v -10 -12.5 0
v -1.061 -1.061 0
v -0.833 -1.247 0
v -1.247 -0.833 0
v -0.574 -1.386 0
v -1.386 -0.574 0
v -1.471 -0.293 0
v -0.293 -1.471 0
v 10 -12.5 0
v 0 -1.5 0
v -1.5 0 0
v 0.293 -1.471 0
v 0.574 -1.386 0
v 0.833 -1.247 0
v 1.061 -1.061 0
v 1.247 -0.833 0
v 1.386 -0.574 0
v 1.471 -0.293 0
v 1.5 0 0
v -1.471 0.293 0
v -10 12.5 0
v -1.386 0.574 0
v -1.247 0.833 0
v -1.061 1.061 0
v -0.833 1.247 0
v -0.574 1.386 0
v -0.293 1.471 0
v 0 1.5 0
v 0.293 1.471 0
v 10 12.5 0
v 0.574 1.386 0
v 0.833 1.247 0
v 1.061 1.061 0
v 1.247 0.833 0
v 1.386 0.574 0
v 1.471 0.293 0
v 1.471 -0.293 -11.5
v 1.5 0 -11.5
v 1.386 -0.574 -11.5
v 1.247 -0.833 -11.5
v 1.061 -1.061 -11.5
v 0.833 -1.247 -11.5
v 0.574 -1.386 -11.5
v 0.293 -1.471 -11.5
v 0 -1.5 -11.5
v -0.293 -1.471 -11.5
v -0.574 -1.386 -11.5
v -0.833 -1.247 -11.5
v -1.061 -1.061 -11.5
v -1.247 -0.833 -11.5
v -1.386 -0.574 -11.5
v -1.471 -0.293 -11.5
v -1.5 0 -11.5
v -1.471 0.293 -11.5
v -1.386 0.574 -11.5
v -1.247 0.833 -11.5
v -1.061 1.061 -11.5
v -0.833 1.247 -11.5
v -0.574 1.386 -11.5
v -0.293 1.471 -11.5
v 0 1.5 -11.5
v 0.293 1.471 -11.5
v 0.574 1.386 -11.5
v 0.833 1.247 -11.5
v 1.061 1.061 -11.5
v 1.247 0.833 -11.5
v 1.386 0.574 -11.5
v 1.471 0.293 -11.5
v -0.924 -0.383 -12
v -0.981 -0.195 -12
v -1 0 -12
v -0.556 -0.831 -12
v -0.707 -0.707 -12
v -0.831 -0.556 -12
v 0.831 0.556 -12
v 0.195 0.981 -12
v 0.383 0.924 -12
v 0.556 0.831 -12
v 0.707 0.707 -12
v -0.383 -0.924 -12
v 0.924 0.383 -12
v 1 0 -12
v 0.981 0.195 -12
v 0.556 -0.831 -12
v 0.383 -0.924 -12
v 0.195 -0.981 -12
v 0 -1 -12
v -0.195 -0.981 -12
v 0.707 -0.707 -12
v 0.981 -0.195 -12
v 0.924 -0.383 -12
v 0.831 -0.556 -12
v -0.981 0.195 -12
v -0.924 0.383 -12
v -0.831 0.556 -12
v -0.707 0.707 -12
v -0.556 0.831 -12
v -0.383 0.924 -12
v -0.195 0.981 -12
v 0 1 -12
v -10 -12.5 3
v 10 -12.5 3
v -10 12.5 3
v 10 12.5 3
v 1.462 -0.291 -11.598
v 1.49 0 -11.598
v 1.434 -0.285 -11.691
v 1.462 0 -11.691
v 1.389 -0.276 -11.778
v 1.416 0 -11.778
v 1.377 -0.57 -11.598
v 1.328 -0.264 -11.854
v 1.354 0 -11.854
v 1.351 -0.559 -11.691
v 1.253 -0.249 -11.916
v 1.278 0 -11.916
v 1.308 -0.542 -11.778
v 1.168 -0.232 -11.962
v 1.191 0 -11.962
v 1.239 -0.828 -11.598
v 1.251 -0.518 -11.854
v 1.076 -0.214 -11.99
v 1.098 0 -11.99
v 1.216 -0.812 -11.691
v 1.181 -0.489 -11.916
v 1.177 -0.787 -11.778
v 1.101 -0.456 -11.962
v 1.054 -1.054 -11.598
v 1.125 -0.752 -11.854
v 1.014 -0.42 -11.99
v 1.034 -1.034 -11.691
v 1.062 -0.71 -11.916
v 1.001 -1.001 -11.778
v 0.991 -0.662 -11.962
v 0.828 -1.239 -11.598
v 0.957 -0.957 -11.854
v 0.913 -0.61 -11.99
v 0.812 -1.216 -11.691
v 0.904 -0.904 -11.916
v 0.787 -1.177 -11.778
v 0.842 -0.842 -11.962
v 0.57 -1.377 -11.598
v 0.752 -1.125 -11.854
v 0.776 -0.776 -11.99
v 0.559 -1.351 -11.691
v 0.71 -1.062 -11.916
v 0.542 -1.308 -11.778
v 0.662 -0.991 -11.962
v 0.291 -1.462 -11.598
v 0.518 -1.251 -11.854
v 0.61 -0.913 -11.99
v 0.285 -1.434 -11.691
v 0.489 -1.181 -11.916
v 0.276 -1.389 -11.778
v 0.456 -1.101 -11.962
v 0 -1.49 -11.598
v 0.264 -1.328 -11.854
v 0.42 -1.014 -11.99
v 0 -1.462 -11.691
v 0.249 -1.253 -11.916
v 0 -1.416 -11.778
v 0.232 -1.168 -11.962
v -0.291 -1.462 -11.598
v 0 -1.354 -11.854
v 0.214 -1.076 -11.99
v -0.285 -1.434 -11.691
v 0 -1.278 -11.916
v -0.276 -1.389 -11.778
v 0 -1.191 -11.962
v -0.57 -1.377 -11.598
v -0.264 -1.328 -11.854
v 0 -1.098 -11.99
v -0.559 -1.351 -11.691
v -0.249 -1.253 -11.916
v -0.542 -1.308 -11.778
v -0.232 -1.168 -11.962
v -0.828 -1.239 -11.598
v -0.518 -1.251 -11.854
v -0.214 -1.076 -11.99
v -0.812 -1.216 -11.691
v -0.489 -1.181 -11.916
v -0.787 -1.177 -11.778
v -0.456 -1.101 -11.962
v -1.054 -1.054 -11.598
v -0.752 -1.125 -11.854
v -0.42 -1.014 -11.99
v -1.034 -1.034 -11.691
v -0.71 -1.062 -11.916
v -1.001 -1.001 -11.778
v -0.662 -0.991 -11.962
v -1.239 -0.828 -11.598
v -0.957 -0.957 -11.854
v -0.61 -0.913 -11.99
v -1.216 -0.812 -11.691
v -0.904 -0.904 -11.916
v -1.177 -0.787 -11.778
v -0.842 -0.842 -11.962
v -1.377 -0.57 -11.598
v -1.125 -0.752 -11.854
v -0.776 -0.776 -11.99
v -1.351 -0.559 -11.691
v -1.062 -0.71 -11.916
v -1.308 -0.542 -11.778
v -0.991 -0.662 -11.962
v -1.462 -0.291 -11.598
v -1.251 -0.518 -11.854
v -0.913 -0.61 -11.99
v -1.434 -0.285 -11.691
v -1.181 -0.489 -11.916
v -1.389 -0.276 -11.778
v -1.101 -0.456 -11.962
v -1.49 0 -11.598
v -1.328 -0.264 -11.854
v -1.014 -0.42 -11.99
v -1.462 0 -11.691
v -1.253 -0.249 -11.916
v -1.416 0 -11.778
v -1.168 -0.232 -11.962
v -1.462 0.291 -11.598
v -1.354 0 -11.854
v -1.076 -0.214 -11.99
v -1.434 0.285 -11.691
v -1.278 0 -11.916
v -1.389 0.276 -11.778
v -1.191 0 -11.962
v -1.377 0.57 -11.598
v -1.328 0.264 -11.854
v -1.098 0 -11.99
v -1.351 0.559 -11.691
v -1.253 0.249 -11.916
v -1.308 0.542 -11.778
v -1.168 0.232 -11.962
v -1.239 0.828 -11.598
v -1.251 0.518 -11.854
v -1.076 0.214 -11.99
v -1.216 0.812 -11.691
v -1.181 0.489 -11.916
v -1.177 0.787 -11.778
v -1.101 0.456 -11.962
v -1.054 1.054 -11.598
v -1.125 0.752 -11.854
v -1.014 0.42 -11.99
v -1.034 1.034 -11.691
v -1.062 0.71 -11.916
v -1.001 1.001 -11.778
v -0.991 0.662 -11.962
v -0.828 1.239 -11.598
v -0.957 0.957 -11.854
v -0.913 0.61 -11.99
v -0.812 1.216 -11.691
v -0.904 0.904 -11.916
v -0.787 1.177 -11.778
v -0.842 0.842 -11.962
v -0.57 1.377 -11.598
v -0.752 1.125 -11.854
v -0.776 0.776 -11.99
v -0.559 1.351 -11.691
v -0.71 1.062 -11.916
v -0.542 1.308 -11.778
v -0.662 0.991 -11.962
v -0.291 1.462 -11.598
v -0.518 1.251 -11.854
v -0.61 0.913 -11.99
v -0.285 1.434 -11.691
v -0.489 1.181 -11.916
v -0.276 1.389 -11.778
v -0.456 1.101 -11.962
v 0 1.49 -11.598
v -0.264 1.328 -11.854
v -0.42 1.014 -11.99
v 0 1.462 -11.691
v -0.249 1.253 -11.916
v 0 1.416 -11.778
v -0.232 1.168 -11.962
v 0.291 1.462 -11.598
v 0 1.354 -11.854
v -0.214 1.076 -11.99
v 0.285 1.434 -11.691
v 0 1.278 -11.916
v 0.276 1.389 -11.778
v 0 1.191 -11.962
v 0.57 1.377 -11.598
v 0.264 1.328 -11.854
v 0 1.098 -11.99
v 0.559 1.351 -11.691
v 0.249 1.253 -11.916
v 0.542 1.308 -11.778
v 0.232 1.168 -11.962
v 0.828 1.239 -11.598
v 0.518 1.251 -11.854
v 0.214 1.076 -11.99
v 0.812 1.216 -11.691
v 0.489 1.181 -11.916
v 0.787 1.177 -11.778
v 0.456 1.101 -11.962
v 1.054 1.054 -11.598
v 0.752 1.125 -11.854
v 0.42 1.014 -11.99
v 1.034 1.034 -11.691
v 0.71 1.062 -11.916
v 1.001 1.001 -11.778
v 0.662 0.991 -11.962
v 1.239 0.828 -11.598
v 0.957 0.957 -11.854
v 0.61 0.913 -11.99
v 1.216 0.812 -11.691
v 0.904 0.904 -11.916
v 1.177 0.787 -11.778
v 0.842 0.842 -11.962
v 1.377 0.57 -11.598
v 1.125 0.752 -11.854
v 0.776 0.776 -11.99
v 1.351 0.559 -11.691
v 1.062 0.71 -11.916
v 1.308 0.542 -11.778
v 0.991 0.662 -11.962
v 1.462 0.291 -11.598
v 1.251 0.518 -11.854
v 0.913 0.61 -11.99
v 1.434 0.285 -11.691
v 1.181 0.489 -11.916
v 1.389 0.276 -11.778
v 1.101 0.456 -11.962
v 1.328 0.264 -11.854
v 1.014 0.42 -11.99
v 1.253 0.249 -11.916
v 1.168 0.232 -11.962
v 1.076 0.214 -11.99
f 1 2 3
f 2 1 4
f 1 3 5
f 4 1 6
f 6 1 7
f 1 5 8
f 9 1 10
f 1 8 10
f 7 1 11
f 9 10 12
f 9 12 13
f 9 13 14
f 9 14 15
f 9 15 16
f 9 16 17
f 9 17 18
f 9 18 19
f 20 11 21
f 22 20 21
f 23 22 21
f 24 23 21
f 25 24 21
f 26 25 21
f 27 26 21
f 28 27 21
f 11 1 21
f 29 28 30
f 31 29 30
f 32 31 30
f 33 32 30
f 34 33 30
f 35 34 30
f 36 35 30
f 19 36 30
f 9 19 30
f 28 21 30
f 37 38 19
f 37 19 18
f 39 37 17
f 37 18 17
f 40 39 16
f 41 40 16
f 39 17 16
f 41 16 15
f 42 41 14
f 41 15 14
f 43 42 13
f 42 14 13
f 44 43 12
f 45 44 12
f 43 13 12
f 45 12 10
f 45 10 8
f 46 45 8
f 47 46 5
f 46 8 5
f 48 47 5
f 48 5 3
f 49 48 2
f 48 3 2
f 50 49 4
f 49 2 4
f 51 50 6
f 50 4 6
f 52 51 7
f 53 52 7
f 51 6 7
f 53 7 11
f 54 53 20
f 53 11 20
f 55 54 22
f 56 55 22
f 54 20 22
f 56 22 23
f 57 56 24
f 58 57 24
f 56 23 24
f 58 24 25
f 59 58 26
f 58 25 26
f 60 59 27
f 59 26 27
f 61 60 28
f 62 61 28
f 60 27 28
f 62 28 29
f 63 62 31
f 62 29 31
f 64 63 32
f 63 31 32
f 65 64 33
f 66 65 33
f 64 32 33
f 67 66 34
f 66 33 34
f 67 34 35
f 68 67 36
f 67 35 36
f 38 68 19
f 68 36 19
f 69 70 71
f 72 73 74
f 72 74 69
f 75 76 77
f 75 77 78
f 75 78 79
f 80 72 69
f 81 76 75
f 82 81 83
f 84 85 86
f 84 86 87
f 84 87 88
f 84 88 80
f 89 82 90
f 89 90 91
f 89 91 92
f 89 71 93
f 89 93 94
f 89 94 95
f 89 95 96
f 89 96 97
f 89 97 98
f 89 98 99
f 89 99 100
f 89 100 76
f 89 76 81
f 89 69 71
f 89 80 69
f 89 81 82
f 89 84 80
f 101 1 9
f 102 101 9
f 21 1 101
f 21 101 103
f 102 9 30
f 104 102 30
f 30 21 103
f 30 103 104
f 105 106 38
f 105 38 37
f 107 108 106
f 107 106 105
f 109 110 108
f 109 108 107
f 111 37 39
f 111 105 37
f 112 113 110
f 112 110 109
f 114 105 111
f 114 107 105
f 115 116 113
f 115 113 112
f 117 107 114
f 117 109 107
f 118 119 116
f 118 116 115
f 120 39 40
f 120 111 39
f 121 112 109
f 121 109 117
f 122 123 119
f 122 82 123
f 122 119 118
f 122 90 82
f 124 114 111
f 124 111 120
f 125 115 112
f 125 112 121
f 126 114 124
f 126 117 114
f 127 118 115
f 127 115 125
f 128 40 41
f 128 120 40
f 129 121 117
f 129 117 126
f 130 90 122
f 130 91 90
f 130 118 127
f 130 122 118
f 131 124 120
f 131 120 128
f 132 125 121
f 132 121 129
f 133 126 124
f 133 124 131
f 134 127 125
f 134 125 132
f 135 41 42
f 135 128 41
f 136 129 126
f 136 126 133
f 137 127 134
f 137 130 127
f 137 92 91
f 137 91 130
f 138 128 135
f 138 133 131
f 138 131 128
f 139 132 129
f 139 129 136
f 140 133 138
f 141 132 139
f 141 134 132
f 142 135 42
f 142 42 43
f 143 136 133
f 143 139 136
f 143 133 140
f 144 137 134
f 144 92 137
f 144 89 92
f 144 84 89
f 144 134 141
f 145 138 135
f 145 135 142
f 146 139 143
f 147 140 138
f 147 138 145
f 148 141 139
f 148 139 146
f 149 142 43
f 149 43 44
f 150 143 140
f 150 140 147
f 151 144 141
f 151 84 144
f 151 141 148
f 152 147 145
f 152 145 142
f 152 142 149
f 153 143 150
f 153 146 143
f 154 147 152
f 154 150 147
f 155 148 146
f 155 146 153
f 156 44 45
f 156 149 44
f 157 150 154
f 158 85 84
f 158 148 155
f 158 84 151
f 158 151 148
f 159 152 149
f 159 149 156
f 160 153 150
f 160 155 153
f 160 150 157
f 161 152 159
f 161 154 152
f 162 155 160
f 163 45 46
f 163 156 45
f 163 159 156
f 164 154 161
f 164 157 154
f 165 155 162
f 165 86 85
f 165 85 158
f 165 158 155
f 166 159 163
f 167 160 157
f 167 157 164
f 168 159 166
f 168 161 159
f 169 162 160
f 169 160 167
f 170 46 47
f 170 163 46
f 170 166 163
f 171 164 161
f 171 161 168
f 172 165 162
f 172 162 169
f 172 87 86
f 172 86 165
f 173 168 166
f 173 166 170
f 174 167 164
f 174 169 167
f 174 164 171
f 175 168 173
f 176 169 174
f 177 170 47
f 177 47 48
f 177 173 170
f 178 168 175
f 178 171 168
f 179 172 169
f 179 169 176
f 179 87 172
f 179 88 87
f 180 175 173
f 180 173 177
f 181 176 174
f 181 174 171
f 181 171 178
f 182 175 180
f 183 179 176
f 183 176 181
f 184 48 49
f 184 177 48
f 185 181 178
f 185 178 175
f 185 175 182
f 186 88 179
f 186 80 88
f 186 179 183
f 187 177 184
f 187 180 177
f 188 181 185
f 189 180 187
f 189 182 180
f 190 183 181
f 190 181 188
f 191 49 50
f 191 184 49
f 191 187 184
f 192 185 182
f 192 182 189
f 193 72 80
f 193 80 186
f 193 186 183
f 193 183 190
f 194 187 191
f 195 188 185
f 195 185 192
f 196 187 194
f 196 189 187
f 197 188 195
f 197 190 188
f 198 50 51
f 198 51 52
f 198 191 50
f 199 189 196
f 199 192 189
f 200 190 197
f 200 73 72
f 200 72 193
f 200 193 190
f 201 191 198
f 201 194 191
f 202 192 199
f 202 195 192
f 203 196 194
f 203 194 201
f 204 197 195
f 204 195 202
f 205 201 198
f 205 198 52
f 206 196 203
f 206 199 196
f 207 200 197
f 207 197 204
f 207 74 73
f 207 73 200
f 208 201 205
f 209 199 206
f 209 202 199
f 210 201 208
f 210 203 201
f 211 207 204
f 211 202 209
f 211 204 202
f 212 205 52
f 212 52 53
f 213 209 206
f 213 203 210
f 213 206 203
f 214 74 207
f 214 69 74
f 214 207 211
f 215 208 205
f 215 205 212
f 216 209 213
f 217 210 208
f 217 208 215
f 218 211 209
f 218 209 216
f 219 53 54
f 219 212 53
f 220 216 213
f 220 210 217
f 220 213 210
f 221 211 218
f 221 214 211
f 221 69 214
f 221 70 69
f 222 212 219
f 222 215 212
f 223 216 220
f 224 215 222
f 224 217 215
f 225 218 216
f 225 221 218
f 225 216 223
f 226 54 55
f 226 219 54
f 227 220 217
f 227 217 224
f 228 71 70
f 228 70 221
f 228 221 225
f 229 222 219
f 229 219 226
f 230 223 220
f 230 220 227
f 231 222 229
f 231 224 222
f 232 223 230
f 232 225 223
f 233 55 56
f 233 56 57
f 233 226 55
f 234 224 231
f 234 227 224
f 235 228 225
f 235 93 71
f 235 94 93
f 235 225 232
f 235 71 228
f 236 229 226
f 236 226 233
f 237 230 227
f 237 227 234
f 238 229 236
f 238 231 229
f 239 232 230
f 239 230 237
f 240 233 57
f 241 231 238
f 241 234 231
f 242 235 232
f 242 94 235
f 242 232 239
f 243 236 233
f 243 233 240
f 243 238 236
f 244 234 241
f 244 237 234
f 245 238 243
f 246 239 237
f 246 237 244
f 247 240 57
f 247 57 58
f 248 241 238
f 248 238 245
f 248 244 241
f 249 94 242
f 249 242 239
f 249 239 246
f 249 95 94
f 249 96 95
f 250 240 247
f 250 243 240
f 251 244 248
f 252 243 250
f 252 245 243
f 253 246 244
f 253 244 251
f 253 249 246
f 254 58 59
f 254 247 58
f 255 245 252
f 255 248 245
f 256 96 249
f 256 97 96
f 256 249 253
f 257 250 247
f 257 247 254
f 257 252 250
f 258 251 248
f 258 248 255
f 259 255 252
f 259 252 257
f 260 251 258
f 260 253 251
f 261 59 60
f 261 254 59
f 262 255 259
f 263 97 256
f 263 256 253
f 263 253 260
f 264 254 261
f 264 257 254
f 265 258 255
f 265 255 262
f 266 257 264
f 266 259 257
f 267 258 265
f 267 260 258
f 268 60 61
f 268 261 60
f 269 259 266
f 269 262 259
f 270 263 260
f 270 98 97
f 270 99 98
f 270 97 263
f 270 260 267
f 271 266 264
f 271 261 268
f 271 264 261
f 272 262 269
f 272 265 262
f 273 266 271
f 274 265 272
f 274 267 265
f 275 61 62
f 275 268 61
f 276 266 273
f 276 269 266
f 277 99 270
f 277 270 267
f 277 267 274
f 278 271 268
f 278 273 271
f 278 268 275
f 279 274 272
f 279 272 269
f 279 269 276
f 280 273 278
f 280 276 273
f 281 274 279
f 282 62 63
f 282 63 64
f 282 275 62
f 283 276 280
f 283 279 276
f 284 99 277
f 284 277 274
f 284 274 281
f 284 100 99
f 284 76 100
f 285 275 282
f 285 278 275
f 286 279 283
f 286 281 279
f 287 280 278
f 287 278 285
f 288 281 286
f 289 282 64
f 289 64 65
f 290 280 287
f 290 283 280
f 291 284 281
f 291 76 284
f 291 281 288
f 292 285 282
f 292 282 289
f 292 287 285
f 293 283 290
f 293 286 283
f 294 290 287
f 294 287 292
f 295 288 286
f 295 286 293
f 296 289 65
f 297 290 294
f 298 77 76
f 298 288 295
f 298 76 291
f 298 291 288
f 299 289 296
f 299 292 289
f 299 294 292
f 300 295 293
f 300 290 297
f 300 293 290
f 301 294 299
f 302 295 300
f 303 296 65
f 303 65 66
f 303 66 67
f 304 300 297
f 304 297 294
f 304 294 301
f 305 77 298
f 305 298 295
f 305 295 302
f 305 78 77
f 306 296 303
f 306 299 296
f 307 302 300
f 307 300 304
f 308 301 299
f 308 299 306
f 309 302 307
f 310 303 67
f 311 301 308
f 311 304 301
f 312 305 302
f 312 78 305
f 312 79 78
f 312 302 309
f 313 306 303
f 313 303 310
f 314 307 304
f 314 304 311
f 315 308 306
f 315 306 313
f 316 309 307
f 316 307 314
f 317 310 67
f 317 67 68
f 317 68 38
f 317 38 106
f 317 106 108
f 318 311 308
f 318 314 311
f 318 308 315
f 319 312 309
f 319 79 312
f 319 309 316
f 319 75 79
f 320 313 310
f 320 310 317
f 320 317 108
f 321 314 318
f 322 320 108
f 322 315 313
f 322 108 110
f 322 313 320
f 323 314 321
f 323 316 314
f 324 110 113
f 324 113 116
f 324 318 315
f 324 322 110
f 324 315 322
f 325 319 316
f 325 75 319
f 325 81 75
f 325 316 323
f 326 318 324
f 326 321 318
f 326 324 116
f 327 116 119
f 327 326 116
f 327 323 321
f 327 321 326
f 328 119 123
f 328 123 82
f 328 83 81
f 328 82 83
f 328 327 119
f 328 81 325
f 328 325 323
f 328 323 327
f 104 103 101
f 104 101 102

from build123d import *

# Parameters (mm, degrees)
F1_W     = 20
F1_H     = 25
F2_DEPTH = 3
F3_R     = 1.5
F4_DEPTH = 12
F0_R     = 0.5


with BuildPart() as f2:
    # F1 (on Top) → F2 (new body)
    with BuildSketch(Plane.XY):
        Rectangle(F1_W, F1_H)
    extrude(amount=F2_DEPTH)

    # F3 (on face) → F4 (join)
    with BuildSketch(Plane(origin=(0, 0, 0), x_dir=(1, 0, 0), z_dir=(0, 0, -1))):
        Circle(F3_R)
    extrude(amount=F4_DEPTH)

    # F0
    f0_edges = [f2.edges().sort_by_distance(p)[0] for p in [
        (-1.5, 0, -12),
    ]]
    fillet(f0_edges, radius=F0_R)


solid = f2.part
